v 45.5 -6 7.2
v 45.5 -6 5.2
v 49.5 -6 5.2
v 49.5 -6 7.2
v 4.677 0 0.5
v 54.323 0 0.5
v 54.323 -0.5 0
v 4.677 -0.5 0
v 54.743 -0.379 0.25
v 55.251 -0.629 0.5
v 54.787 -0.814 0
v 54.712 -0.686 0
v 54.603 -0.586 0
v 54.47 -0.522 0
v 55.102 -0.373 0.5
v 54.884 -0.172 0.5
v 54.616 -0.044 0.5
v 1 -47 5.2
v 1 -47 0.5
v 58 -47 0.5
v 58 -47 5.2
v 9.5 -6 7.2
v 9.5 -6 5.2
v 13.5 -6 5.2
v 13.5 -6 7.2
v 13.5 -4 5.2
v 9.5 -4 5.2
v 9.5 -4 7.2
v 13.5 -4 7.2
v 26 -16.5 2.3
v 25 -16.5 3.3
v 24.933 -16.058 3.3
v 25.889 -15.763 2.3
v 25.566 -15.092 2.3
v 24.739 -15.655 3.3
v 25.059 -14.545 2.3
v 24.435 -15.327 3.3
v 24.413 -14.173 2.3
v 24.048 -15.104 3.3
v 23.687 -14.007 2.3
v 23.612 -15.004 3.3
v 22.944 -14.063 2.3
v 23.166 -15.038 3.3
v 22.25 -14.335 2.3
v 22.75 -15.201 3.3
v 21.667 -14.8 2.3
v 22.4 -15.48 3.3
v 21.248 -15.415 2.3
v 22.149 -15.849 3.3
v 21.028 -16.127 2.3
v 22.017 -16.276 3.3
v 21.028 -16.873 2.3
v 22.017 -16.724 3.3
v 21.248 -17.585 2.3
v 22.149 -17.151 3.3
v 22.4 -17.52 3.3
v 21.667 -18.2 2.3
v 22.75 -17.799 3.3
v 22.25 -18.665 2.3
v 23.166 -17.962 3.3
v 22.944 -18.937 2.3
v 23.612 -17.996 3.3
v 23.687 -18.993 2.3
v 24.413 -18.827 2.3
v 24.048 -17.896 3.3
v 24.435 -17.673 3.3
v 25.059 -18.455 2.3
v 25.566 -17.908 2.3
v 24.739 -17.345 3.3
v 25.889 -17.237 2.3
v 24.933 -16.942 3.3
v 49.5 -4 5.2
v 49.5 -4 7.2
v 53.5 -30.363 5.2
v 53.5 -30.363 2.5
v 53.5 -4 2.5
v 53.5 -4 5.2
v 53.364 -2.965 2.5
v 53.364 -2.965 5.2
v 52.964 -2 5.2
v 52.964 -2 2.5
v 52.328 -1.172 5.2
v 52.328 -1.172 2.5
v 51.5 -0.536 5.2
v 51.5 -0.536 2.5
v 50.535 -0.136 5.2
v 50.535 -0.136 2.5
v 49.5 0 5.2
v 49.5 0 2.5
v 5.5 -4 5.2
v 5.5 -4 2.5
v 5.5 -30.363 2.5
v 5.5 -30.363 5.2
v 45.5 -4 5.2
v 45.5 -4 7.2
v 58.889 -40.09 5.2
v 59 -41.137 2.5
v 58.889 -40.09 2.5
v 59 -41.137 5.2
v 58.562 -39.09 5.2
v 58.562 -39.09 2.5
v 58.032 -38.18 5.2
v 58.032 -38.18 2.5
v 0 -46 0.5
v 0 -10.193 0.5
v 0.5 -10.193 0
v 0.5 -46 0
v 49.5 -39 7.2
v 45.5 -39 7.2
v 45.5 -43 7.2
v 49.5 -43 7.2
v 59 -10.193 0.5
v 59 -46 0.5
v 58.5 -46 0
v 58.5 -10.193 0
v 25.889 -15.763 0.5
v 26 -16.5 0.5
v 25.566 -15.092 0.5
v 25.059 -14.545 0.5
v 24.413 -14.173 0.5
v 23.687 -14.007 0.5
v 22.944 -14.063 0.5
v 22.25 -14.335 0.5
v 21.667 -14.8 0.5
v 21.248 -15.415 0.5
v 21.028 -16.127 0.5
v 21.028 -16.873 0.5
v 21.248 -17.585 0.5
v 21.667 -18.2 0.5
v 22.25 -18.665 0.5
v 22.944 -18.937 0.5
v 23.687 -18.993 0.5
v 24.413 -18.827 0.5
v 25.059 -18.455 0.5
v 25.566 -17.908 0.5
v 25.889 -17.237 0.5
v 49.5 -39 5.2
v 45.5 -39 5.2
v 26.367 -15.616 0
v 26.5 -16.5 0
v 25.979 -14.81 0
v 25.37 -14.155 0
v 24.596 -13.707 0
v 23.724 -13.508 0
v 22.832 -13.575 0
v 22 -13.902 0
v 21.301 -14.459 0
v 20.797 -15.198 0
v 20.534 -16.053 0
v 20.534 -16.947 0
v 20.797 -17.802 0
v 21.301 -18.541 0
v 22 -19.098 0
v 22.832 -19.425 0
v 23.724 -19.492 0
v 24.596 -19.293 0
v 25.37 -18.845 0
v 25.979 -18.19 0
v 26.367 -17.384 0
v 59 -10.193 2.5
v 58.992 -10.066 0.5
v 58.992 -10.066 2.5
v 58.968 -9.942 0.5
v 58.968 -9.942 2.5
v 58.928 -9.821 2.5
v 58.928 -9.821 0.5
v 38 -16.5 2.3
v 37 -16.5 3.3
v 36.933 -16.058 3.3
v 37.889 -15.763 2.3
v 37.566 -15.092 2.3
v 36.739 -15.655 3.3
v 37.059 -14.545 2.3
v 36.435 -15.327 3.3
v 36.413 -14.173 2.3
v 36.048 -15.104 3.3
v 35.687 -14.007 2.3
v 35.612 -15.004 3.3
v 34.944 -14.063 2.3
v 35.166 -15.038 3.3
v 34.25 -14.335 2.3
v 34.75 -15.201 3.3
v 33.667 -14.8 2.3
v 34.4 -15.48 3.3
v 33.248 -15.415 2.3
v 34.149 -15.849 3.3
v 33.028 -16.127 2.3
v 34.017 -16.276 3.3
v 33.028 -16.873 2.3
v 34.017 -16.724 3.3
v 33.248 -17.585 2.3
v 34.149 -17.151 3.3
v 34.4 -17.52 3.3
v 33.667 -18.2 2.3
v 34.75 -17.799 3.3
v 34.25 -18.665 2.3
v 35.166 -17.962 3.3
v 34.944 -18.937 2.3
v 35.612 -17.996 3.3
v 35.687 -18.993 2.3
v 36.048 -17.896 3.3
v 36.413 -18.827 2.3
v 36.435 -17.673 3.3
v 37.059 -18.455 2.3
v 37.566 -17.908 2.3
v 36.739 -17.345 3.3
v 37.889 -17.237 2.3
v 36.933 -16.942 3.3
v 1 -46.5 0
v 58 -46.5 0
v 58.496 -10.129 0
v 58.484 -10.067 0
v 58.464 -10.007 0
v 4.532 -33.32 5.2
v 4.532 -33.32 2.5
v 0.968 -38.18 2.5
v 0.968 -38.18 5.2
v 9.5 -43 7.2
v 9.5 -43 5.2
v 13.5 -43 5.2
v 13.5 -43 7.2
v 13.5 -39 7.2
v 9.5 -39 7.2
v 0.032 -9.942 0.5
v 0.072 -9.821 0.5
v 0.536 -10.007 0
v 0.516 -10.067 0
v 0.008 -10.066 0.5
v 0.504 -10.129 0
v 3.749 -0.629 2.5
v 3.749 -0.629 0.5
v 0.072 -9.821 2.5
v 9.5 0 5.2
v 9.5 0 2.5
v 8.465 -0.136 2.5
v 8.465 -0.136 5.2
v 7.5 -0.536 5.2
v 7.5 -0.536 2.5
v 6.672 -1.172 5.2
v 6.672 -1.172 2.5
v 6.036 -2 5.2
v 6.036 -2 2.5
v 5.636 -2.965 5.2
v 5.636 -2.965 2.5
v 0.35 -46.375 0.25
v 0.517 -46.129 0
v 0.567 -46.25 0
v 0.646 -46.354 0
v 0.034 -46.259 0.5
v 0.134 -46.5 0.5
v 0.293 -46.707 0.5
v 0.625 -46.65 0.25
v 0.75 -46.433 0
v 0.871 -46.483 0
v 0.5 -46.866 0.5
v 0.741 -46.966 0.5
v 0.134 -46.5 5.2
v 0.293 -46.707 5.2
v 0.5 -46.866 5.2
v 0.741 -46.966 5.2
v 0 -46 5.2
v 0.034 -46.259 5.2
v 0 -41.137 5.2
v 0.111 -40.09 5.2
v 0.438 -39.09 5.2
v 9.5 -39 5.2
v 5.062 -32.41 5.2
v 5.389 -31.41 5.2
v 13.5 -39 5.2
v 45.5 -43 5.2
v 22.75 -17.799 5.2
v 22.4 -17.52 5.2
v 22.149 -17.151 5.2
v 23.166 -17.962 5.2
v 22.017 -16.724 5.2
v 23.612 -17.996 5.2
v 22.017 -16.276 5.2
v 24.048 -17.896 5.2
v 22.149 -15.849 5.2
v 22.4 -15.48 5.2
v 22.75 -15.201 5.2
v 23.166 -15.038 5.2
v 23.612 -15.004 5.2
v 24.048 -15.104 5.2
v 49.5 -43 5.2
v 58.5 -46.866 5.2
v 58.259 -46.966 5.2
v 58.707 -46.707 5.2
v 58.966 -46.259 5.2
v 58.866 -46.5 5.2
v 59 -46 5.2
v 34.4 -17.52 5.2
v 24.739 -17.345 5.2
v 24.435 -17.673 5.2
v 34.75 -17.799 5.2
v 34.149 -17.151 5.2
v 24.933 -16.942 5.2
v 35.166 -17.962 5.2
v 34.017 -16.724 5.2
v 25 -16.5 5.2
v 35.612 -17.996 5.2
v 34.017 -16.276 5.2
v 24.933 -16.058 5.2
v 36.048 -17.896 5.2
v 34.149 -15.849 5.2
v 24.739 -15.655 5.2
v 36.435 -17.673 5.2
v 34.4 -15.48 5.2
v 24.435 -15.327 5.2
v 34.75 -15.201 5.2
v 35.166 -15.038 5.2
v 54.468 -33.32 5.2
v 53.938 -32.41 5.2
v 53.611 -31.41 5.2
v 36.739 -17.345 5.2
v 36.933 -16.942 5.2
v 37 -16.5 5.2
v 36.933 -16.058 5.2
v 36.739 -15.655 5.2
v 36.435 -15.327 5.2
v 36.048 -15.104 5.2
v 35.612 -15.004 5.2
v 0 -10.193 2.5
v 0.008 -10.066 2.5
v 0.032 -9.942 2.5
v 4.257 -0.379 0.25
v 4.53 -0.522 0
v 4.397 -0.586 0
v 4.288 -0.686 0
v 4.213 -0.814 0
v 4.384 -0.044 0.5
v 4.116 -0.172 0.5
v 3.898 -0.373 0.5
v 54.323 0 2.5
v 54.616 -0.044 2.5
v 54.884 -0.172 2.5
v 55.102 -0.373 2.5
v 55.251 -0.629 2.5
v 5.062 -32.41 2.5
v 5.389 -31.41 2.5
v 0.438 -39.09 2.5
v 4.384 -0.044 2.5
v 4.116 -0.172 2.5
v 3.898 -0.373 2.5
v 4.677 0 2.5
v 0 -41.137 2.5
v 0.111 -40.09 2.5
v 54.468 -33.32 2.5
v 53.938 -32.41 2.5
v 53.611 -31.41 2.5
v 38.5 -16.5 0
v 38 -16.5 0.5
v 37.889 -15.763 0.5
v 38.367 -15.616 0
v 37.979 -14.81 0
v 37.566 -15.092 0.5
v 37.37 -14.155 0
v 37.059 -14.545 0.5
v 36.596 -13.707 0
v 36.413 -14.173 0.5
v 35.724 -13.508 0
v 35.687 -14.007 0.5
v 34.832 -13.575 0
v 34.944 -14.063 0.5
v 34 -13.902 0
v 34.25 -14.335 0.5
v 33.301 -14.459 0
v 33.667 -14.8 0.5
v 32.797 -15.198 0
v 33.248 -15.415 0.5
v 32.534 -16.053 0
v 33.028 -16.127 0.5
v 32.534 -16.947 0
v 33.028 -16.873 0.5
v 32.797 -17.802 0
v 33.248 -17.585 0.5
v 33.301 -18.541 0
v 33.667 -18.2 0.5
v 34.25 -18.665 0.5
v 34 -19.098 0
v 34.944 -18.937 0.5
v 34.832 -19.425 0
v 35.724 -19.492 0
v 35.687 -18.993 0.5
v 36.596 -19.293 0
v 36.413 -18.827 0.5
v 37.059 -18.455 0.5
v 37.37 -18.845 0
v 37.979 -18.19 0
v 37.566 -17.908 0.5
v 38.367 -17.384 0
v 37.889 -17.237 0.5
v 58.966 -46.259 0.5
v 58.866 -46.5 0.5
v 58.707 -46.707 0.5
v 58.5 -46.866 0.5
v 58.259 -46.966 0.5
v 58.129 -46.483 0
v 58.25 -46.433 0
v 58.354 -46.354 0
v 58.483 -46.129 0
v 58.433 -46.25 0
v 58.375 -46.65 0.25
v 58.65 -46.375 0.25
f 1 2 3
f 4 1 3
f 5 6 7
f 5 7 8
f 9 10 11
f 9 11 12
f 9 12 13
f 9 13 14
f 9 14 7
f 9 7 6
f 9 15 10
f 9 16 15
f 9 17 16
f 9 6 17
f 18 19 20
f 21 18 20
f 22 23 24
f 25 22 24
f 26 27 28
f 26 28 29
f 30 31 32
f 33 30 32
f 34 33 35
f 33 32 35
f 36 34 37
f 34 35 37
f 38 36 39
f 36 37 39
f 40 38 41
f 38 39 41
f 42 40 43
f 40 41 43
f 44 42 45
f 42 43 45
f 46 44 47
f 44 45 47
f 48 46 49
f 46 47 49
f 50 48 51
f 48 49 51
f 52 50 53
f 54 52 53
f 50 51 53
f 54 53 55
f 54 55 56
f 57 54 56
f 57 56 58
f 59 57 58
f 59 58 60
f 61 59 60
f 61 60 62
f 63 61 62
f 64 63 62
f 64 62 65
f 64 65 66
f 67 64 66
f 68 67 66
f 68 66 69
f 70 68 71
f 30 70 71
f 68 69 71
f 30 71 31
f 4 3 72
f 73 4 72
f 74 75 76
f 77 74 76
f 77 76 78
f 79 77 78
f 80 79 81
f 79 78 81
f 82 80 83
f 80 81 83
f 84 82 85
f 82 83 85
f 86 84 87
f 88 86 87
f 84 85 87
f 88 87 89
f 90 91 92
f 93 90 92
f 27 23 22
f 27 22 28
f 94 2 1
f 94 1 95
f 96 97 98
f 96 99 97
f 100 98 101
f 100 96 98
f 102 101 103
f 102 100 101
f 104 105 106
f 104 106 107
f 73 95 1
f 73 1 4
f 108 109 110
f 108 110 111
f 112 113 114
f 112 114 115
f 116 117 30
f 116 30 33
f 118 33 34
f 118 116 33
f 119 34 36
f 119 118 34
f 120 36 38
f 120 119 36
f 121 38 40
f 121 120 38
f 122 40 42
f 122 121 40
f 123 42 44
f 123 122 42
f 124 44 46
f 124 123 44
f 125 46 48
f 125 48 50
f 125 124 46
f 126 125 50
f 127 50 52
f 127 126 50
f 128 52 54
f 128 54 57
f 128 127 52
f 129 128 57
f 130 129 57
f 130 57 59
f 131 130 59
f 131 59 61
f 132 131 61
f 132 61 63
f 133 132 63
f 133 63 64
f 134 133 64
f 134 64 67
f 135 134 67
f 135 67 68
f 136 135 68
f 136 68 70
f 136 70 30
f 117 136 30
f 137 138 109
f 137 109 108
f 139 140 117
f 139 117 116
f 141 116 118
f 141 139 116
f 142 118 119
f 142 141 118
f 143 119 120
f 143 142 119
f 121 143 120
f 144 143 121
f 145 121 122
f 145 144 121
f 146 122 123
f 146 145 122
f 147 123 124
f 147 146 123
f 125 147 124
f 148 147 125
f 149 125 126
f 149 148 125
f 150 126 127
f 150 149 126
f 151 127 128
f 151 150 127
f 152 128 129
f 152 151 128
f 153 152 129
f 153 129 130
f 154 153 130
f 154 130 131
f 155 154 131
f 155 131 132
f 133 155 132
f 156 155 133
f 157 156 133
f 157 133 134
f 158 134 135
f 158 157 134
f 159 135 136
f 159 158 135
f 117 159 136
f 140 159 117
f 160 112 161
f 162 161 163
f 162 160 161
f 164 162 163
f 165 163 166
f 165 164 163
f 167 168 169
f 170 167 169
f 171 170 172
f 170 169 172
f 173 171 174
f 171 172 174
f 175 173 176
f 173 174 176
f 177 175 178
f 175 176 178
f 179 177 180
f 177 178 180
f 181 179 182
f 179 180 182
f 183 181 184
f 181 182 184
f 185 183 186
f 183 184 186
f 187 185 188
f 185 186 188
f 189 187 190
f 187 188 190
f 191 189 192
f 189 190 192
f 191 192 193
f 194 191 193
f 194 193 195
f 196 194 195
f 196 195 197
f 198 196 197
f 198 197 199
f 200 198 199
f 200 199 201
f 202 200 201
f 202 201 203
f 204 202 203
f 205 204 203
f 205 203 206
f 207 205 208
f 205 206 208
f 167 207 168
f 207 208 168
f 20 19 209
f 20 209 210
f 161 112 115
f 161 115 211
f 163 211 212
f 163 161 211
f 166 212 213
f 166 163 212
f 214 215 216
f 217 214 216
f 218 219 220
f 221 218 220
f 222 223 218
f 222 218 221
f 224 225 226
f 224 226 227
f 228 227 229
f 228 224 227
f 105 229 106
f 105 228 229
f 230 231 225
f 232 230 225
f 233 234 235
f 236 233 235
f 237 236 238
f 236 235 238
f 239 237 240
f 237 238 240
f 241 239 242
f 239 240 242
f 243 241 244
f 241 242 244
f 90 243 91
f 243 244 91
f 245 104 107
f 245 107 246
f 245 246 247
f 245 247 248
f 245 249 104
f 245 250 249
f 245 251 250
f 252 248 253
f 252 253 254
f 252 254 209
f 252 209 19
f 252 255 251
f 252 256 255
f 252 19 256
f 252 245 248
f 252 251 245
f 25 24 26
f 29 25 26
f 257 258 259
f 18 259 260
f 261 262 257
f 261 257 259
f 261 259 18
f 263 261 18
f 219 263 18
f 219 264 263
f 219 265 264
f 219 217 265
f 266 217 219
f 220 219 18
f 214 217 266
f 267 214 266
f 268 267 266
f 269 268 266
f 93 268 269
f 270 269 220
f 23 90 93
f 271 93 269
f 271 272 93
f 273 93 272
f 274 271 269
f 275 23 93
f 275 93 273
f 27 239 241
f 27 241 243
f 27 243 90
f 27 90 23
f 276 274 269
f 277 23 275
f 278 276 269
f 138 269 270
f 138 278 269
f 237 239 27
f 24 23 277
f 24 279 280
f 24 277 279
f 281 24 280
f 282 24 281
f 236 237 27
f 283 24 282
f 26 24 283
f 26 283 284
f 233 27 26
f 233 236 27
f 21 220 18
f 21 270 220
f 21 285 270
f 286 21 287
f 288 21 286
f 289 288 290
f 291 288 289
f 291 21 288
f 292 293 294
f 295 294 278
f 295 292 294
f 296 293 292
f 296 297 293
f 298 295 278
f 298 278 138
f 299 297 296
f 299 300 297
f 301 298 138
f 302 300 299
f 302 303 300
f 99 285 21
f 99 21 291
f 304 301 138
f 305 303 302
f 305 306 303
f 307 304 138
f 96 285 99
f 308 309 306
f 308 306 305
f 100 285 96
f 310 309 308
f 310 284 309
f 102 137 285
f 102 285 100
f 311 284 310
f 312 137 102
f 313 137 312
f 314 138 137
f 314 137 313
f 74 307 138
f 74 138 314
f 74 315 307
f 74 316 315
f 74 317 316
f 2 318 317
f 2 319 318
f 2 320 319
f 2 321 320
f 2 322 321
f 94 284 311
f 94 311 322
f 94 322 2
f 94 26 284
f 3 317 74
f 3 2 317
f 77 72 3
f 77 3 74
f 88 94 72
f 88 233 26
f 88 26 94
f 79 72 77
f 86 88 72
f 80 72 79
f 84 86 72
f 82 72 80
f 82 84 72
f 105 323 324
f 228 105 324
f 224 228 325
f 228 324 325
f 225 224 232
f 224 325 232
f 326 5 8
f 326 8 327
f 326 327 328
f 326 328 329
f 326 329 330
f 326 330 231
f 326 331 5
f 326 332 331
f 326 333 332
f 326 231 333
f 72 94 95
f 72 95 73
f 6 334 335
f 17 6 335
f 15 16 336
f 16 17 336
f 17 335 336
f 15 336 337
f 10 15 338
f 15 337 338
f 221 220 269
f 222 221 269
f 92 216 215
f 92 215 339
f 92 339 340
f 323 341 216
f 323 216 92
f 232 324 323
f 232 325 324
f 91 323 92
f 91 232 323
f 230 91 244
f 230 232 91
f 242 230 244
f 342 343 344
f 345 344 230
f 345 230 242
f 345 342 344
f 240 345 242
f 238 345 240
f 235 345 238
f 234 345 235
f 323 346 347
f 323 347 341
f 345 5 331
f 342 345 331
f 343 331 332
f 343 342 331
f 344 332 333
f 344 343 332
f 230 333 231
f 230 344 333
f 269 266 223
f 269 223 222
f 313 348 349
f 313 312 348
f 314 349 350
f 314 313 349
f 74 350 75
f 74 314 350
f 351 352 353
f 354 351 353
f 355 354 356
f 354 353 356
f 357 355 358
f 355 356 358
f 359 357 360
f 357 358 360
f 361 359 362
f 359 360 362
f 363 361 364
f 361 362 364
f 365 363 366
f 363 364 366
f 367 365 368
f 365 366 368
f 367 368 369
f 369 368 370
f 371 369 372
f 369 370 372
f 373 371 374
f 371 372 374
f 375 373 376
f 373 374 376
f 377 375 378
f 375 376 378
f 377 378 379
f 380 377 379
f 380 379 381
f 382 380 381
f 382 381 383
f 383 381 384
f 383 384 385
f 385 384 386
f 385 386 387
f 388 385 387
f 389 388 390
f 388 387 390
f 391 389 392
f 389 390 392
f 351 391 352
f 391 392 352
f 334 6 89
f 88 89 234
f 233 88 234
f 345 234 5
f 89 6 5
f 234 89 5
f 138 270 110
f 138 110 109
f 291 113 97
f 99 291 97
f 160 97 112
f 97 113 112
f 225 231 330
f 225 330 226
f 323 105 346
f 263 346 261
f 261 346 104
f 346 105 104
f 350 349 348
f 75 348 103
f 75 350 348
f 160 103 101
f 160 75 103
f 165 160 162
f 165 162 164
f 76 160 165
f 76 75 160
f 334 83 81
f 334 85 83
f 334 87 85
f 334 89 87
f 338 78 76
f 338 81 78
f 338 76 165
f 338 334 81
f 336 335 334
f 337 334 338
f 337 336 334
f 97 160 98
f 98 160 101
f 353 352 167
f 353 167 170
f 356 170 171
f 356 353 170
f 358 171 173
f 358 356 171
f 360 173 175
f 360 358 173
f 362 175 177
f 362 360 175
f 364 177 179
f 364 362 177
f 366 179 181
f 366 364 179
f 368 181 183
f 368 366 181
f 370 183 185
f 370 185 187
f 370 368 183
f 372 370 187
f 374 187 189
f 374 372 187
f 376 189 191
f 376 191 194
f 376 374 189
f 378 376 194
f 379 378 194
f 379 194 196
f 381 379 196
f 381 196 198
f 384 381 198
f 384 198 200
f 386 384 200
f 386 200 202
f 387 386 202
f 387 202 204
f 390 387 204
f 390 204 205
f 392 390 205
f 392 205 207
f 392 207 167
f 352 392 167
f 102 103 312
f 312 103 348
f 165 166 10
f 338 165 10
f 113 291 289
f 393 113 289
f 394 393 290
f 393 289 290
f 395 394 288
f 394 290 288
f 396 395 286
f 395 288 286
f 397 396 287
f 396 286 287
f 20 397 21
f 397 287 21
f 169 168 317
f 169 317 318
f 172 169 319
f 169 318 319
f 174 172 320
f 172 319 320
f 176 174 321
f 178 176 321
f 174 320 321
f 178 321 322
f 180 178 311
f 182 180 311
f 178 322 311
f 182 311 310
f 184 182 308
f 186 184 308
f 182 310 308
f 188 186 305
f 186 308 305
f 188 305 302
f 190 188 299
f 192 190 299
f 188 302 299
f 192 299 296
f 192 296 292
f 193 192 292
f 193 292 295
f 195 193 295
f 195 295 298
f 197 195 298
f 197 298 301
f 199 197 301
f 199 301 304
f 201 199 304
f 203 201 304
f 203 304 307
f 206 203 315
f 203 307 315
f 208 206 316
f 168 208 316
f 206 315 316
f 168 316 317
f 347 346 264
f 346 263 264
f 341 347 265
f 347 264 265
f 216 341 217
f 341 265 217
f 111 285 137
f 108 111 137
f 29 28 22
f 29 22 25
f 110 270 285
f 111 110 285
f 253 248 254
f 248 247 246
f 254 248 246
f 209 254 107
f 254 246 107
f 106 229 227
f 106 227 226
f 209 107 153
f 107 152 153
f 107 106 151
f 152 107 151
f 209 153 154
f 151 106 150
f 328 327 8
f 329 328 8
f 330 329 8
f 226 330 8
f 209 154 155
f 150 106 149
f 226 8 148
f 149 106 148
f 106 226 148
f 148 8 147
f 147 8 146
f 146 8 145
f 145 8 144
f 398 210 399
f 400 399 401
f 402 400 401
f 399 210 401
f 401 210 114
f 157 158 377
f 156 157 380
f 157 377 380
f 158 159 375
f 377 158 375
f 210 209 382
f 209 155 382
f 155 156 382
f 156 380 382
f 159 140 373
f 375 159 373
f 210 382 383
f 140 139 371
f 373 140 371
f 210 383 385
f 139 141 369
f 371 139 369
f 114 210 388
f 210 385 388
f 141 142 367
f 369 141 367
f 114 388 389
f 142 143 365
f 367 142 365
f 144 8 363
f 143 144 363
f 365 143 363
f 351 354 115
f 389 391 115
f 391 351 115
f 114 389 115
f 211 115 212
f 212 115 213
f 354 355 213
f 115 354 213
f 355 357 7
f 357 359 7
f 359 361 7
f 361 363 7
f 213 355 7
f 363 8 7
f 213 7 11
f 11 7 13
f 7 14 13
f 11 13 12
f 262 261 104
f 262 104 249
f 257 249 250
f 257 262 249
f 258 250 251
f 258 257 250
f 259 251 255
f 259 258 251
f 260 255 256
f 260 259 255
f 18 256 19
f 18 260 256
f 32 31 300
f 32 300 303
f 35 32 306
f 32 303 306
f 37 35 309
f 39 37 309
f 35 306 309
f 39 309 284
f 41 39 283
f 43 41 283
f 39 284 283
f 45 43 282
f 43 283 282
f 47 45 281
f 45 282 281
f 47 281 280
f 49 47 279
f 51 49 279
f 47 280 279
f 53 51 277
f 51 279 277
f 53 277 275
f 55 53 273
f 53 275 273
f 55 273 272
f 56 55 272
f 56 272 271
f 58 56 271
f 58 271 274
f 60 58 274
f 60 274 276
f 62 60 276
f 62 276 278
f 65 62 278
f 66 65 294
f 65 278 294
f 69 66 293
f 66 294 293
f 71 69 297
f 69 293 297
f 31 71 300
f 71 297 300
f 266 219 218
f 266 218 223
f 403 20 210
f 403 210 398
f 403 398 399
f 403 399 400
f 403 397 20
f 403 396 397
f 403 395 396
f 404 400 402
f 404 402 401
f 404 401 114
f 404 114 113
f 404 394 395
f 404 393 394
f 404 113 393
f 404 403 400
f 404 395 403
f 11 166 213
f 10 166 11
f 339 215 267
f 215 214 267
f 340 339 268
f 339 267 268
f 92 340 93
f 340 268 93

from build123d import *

# Parameters (mm, degrees)
F1_DEPTH      = 2.5
F3_DEPTH      = 2.7
F4_R          = 1
F5_R          = 5
F6_W          = 4
F6_H          = 2
F6_H_2        = 4
F7_DEPTH      = 2
F8_R          = 1.5
F9_DEPTH      = 6
F10_R         = 2.5
F11_DEPTH     = 3.5
F12_S5_R      = 1.5
F12_T6_DEPTH  = 5
F12_S11_R     = 1.5
F12_T12_DEPTH = 5
F13_SIZE      = 0.5


# Not quite as in the source:
# - a fillet or chamfer that OpenCascade refuses, or shapes differently, is made with other operations: its cross-section is extruded or revolved along the edge and cut away or added


with BuildPart() as f1:
    # F0 (on Top) → F1 (new body)
    with BuildSketch(Plane.XY):
        Polygon((55, 0), (4, 0), (0, -10), (0, -47), (59, -47), (59, -10), align=None)
    extrude(amount=F1_DEPTH)

    # F2 (on face) → F3 (join)
    with BuildSketch(Plane.XY.offset(2.5)):
        with BuildLine():
            Line((0, -39.5), (0, -47))
            Line((0, -47), (59, -47))
            Line((59, -47), (59, -39.5))
            Line((59, -39.5), (53.5, -32))
            Line((53.5, -32), (53.5, -4))
            ThreePointArc((53.5, -4), (52.3284271247, -1.1715728753), (49.5, 0))
            Line((49.5, 0), (9.5, 0))
            ThreePointArc((9.5, 0), (6.6715728753, -1.1715728753), (5.5, -4))
            Line((5.5, -4), (5.5, -32))
            Line((5.5, -32), (0, -39.5))
        make_face()
    extrude(amount=F3_DEPTH)

    # F4
    f4_edges = [f1.edges().sort_by_distance(p)[0] for p in [
        (0, -47, 2.6),
        (59, -47, 2.6),
        (4, 0, 1.25),
        (55, 0, 1.25),
        (59, -10, 1.25),
        (0, -10, 1.25),
    ]]
    fillet(f4_edges, radius=F4_R)

    # F5
    f5_edges = [f1.edges().sort_by_distance(p)[0] for p in [
        (0, -39.5, 3.85),
        (59, -39.5, 3.85),
        (53.5, -32, 3.85),
        (5.5, -32, 3.85),
    ]]
    fillet(f5_edges, radius=F5_R)

    # F6 (on face) → F7 (join)
    with BuildSketch(Plane.XY.offset(5.2)):
        with Locations((11.5, -5)):
            Rectangle(F6_W, F6_H)
        with Locations((11.5, -41)):
            Rectangle(F6_W, F6_H_2)
        with Locations((47.5, -5)):
            Rectangle(F6_W, F6_H)
        with Locations((47.5, -41)):
            Rectangle(F6_W, F6_H_2)
    extrude(amount=F7_DEPTH)

    # F8 (on face) → F9 (cut)
    with BuildSketch(Plane.XY.offset(5.2)):
        with Locations((23.5, -16.5)):
            Circle(F8_R)
        with Locations((35.5, -16.5)):
            Circle(F8_R)
    extrude(amount=-F9_DEPTH, mode=Mode.SUBTRACT)

    # F10 (on face) → F11 (cut)
    with BuildSketch(Plane.XY):
        with Locations((35.5, -16.5)):
            Circle(F10_R)
        with Locations((23.5, -16.5)):
            Circle(F10_R)
    extrude(amount=F11_DEPTH, mode=Mode.SUBTRACT)

    # F12: chamfer of 1.2 on 2 edges, made by hand


with BuildPart() as f12_tool2:
    # F12_s3 → F12_t4 (revolve)
    with BuildSketch(Plane.XZ.offset(16.5)):
        Polygon((38, 2.3), (36.8, 3.5), (38, 3.5), align=None)
    revolve(axis=Axis((35.5, -16.5, 3.5), (0, 0, 1)))

    # F12_s5 → F12_t6 (cut, symmetric)
    with BuildSketch(Plane.XY.offset(2.9)):
        with Locations((35.5, -16.5)):
            Circle(F12_S5_R)
    extrude(amount=F12_T6_DEPTH, both=True, mode=Mode.SUBTRACT)


with BuildPart() as f1_1:
    add(f1.part)

    # F12_t1: union F12_tool2
    add(f12_tool2.part)


with BuildPart() as f12_tool8:
    # F12_s9 → F12_t10 (revolve)
    with BuildSketch(Plane.XZ.offset(16.5)):
        Polygon((26, 2.3), (24.8, 3.5), (26, 3.5), align=None)
    revolve(axis=Axis((23.5, -16.5, 3.5), (0, 0, 1)))

    # F12_s11 → F12_t12 (cut, symmetric)
    with BuildSketch(Plane.XY.offset(2.9)):
        with Locations((23.5, -16.5)):
            Circle(F12_S11_R)
    extrude(amount=F12_T12_DEPTH, both=True, mode=Mode.SUBTRACT)


with BuildPart() as f1_2:
    add(f1_1.part)

    # F12_t7: union F12_tool8
    add(f12_tool8.part)

    # F13
    f13_edges = [f1_2.edges().sort_by_distance(p)[0] for p in [
        (29.5, 0, 0),
        (54.883596, -0.171933, 0),
        (4.116404, -0.171933, 0),
        (57.08996, -5.224901, 0),
        (1.91004, -5.224901, 0),
        (58.981956, -10.003475, 0),
        (0.018044, -10.003475, 0),
        (59, -28.096291, 0),
        (0, -28.096291, 0),
        (58.707107, -46.707107, 0),
        (0.292893, -46.707107, 0),
        (29.5, -47, 0),
        (21, -16.5, 0),
        (33, -16.5, 0),
    ]]
    chamfer(f13_edges, length=F13_SIZE)


solid = f1_2.part
